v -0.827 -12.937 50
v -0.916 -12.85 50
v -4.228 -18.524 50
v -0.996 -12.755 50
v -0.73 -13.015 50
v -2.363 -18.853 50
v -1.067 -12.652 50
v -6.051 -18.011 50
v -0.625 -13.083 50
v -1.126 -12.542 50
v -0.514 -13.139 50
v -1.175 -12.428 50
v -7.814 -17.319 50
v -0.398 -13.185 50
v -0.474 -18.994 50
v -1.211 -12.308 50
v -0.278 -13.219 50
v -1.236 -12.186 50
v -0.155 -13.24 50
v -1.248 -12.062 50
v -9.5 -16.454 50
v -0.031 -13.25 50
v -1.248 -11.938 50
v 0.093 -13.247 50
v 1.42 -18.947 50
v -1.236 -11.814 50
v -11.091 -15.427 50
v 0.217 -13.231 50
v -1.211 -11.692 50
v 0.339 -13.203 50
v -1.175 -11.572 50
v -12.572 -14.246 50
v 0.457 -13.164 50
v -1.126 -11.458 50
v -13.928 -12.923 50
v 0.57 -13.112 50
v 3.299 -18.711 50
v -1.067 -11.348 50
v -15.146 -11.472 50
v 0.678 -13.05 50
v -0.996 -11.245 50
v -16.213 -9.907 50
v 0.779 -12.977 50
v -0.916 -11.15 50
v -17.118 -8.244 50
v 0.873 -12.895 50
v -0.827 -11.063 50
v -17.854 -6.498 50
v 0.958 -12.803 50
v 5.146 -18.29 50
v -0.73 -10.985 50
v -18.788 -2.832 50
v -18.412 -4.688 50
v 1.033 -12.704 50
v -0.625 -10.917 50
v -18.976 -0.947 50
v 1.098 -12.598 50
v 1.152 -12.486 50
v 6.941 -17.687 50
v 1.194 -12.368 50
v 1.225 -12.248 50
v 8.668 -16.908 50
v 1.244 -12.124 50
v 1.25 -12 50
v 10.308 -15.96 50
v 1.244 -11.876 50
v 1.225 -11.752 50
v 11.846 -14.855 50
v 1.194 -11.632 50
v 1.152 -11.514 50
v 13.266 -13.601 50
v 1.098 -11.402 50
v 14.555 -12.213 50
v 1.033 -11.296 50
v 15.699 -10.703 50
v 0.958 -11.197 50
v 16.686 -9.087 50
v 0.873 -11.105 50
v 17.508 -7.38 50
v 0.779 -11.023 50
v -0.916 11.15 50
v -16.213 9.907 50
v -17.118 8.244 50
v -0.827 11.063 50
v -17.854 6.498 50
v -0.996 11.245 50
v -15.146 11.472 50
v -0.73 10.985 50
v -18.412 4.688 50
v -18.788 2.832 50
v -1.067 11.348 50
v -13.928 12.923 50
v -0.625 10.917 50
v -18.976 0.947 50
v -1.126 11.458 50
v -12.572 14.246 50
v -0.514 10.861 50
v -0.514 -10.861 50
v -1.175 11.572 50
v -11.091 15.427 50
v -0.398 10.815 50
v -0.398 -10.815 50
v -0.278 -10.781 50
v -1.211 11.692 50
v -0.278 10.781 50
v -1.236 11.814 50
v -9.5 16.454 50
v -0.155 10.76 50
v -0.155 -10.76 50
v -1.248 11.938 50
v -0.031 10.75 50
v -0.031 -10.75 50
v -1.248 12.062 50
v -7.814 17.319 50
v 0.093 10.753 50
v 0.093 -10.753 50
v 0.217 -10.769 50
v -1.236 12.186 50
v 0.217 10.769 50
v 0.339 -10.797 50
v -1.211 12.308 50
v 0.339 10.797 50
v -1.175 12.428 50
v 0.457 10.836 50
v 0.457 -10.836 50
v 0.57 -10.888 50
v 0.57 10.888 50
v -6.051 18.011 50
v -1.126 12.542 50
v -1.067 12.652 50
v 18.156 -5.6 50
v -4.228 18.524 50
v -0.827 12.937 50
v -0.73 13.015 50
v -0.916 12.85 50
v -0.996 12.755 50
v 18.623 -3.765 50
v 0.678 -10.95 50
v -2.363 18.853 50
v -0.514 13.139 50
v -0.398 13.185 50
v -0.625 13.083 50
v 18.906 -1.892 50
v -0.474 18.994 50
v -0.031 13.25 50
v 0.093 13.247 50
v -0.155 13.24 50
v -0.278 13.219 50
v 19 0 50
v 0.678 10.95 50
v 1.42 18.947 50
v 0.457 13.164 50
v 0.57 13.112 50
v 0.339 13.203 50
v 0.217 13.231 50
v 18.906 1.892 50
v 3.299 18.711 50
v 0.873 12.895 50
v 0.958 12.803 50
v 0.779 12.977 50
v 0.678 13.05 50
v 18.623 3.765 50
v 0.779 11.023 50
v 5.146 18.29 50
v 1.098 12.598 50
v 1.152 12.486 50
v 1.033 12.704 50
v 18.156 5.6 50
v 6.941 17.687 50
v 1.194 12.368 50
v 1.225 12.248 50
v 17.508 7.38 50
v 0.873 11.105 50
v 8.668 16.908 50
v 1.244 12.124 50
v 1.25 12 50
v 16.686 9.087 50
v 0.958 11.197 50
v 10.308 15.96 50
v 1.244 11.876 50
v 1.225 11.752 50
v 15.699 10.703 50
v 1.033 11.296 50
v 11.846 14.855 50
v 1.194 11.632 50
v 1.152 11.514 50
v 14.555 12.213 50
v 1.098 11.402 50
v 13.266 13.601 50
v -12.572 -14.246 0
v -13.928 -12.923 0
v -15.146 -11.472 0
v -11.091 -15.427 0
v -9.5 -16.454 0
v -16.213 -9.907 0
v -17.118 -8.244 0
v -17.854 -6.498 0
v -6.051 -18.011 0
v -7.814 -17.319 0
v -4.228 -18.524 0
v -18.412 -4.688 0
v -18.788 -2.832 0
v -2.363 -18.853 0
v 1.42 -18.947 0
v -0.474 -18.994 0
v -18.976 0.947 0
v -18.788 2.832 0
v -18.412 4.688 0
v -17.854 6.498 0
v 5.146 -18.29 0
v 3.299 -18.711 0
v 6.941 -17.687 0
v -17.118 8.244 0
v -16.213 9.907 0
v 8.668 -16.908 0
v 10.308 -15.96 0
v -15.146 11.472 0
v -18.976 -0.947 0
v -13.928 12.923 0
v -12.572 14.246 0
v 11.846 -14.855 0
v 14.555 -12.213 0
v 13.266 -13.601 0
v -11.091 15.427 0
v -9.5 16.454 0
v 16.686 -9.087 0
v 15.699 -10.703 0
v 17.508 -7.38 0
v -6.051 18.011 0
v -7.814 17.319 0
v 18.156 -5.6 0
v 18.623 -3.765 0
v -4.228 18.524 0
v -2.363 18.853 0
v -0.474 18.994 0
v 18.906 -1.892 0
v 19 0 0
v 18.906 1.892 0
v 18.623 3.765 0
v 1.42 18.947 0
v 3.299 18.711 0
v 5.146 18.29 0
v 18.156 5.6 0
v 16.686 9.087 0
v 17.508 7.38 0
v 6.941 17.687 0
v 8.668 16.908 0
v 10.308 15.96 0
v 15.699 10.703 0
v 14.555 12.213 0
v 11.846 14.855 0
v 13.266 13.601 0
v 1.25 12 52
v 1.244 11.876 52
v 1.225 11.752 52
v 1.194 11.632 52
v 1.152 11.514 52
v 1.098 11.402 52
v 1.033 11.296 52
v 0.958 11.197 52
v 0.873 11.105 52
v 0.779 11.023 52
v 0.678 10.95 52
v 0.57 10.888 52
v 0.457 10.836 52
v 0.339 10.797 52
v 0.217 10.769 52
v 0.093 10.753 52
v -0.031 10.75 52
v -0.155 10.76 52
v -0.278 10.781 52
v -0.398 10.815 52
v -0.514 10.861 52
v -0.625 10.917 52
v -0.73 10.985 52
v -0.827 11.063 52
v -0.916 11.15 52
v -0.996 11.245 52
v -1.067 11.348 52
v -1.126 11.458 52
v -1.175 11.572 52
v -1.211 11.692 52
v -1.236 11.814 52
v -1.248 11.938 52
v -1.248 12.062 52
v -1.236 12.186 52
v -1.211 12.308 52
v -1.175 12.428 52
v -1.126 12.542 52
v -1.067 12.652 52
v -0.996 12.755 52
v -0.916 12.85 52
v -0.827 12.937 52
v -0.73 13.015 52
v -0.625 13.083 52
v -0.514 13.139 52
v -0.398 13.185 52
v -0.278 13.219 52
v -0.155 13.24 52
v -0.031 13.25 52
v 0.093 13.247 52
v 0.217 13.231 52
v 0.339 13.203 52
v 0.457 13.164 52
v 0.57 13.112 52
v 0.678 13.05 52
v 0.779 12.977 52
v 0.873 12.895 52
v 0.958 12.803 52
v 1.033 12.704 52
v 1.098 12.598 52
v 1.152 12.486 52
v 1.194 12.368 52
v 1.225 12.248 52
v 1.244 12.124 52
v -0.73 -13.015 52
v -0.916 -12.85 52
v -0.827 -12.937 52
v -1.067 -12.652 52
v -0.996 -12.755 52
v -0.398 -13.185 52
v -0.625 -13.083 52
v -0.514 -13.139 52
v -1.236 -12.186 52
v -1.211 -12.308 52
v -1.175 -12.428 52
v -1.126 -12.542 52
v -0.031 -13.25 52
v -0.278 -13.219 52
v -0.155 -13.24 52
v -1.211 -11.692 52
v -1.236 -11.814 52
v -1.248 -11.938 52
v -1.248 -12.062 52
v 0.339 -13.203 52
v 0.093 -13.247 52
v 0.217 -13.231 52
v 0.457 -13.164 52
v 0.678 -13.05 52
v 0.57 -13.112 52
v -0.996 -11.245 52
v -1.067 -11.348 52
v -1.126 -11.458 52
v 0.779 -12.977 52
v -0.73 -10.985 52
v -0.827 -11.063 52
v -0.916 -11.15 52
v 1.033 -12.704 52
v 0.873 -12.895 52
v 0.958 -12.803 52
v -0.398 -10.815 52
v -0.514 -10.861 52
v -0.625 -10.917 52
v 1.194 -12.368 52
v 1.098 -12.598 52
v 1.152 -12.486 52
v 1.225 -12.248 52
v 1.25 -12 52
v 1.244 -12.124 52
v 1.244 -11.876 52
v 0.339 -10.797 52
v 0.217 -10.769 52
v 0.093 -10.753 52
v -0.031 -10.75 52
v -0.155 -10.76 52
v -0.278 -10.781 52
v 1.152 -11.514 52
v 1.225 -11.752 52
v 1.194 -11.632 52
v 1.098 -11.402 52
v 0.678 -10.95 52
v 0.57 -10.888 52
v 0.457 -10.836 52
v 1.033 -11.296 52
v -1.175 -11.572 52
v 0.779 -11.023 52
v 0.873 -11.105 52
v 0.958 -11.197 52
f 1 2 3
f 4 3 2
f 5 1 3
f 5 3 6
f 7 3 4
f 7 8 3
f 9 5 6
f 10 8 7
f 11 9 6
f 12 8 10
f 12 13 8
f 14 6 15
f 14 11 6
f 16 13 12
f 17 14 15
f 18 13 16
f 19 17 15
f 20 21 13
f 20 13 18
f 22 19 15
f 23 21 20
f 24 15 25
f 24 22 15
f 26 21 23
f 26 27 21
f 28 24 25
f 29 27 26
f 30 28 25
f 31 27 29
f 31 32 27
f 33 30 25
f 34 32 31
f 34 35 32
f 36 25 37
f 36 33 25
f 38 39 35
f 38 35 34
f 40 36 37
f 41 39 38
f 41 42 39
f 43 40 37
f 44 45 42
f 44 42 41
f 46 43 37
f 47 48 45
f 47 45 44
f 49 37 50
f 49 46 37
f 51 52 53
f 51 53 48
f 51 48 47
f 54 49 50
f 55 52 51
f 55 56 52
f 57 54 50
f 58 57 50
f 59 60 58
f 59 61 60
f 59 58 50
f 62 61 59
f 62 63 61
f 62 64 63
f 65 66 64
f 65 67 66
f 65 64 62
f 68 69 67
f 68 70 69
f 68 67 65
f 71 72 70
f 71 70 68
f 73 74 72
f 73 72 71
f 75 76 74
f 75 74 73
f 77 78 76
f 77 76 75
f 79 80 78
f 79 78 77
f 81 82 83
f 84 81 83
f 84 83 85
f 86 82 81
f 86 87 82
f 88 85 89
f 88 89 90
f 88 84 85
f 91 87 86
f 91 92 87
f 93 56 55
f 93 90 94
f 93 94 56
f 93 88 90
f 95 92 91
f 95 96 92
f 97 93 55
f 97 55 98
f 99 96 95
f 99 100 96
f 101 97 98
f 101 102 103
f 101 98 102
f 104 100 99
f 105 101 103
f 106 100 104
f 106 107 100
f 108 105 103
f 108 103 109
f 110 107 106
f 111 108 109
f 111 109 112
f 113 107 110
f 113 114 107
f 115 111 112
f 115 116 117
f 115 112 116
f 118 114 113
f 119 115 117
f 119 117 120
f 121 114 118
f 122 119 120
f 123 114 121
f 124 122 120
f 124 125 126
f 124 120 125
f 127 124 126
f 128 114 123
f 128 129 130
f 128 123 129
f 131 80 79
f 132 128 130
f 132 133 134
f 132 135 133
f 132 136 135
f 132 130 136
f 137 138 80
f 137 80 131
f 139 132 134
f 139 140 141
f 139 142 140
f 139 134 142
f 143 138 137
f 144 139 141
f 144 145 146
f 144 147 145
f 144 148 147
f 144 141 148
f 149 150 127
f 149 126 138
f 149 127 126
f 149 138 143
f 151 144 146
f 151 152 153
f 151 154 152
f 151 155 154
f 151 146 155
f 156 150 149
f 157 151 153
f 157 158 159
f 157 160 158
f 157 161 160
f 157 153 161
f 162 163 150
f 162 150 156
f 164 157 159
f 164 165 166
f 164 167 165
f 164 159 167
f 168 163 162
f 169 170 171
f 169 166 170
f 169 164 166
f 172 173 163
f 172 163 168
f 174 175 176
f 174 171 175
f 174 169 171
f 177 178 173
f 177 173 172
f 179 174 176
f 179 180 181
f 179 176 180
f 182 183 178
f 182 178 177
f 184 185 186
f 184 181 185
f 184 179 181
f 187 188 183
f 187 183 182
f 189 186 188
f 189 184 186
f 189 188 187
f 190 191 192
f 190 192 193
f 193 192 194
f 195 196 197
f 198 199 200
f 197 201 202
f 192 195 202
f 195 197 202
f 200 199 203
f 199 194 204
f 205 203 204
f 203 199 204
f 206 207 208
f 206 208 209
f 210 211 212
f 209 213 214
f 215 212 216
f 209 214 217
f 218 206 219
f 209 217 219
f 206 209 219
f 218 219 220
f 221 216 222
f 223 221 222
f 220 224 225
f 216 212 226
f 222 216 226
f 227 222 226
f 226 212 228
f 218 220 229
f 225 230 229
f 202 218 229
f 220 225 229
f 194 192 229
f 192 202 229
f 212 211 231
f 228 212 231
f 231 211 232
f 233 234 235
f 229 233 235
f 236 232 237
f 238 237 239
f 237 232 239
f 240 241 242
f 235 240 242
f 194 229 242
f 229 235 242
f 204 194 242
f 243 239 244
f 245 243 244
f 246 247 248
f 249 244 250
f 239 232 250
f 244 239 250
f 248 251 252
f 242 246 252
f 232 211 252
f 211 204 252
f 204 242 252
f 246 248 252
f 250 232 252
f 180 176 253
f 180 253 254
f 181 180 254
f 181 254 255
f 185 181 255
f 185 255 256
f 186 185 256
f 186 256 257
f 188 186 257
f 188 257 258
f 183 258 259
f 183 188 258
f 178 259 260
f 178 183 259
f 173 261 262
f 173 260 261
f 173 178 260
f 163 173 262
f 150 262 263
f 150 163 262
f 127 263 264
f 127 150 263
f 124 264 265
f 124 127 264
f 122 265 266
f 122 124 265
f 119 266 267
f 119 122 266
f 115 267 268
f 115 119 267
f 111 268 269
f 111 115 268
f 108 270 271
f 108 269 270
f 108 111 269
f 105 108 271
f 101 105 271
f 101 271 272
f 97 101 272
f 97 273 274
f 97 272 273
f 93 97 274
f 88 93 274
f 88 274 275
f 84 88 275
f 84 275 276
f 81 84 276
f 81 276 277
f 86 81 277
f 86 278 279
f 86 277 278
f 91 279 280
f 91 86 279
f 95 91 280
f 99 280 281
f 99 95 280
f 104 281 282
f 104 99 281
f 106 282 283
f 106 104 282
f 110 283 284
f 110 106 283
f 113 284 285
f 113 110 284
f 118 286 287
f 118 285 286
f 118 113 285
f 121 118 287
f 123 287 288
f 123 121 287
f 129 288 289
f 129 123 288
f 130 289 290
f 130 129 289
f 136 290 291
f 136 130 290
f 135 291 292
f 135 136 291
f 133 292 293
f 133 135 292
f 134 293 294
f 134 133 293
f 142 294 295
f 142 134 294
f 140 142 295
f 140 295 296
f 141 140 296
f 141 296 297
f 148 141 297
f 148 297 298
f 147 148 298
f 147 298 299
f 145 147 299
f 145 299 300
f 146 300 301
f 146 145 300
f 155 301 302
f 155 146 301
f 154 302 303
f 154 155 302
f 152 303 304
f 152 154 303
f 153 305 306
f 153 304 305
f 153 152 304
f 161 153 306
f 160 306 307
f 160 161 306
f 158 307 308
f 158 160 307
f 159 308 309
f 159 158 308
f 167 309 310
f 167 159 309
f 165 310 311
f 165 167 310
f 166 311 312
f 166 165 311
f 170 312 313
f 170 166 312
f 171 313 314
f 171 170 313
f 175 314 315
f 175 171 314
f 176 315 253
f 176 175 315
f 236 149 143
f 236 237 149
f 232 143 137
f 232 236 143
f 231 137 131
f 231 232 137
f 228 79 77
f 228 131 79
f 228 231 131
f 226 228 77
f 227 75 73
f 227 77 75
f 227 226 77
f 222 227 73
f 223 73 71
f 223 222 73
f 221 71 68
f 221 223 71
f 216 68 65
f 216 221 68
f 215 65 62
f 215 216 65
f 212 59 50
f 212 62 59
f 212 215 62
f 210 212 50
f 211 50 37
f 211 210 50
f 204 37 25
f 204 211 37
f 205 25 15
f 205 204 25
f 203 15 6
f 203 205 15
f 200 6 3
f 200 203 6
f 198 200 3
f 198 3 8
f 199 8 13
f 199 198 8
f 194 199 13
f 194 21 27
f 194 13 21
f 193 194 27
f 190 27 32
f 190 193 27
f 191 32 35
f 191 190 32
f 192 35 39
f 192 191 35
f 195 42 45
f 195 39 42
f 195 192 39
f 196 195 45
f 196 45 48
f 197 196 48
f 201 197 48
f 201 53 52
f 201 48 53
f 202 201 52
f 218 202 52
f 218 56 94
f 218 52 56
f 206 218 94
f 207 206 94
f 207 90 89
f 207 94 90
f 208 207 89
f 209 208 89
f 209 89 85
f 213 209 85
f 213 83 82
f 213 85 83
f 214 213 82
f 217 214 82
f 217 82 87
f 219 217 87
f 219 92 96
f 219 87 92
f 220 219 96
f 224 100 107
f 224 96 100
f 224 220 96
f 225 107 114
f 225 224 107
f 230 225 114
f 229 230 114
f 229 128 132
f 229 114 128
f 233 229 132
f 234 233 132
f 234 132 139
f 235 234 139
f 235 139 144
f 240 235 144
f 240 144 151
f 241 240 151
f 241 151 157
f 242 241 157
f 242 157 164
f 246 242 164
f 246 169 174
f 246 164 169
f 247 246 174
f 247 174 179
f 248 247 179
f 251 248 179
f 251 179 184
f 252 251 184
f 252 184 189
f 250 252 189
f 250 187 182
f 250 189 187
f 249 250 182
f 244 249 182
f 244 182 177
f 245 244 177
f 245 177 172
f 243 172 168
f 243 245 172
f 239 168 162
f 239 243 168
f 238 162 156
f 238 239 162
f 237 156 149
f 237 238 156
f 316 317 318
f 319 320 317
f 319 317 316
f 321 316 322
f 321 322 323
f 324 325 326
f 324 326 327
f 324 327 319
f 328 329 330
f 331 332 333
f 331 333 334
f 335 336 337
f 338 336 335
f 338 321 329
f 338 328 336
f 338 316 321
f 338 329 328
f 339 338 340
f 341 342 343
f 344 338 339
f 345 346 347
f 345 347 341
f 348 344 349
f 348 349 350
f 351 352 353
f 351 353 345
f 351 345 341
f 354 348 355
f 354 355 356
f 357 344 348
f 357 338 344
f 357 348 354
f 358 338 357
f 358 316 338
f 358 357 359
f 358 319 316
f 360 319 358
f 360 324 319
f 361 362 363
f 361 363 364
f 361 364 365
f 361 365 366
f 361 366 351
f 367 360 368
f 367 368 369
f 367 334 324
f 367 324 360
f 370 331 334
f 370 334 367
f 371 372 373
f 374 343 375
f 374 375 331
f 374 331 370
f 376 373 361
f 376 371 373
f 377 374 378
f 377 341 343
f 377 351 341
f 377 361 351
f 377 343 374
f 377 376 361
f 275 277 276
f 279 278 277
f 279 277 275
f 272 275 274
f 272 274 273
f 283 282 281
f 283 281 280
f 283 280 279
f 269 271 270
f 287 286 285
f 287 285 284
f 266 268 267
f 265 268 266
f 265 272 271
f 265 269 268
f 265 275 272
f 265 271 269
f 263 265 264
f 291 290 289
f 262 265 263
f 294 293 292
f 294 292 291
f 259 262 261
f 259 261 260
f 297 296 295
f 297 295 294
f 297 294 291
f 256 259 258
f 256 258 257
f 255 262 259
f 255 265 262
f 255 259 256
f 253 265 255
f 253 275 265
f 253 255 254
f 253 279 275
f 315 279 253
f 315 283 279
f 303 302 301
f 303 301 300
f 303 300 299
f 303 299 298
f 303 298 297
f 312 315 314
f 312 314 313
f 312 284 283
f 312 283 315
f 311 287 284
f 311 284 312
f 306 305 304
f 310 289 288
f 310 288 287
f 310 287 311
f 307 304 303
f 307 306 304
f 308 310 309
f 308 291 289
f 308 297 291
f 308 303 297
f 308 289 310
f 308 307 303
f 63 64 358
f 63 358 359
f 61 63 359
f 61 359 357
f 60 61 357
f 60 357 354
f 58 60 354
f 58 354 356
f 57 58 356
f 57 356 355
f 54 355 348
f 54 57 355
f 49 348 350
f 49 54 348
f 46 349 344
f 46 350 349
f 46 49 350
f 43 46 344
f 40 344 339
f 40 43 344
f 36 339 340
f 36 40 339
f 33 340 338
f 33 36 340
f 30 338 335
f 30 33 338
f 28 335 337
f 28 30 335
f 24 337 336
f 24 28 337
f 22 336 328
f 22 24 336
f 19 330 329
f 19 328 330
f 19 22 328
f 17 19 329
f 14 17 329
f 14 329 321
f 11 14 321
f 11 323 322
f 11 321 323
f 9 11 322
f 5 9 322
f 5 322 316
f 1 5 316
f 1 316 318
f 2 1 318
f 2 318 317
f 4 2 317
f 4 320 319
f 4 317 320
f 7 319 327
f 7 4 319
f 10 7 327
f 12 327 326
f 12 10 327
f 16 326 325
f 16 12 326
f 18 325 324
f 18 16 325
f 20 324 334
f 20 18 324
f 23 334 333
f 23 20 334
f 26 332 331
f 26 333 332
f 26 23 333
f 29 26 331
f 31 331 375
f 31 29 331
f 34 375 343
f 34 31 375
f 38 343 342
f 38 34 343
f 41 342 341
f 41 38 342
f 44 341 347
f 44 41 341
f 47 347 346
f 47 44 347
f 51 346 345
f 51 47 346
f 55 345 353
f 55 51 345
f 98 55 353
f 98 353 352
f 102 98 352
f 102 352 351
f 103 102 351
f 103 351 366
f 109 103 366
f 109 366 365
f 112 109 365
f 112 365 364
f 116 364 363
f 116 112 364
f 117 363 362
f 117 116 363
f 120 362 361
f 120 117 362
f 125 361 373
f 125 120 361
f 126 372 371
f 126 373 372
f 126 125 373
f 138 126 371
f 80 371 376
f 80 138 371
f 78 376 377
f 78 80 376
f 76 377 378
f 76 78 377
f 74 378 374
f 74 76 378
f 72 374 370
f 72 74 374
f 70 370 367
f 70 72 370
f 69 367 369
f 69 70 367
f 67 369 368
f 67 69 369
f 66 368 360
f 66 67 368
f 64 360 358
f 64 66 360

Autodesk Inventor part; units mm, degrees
ref_plane "YZ Plane" through (0, 0, 0) normal (1, 0, 0) x (0, 1, 0)
ref_plane "XZ Plane" through (0, 0, 0) normal (0, 1, 0) x (-1, 0, 0)
ref_plane "XY Plane" through (0, 0, 0) normal (0, 0, 1) x (1, 0, 0)
sketch "Sketch1" plane through (0, 0, 0) normal (0, 0, 1) x (1, 0, 0)
  circle A0 centre (0, 0) radius 19
  dimension "d1" = 38
extrude "Extrusion1" add sketch "Sketch1" along normal blind 50
sketch "Sketch2" plane through (0, 0, 50) normal (0, 0, 1) x (1, 0, 0)
  circle A0 centre (0, 12) radius 1.25
  circle A1 centre (0, -12) radius 1.25
  point P0 (0, 0)
  dimension "d4" = 12
  dimension "d5" = 12
  dimension "d6" = 2.5
  dimension "d7" = 2.5
extrude "Extrusion2" add sketch "Sketch2" along normal blind 2 contours A0
sketch "Sketch3" plane through (0, 0, 50) normal (0, 0, 1) x (1, 0, 0)
  circle A0 centre (0, -12) radius 1.25
  point P0 (0, 0)
  dimension "d10" = 12
  dimension "d11" = 2.5
extrude "Extrusion3" add sketch "Sketch3" along normal blind 2
properties part number "motor"
